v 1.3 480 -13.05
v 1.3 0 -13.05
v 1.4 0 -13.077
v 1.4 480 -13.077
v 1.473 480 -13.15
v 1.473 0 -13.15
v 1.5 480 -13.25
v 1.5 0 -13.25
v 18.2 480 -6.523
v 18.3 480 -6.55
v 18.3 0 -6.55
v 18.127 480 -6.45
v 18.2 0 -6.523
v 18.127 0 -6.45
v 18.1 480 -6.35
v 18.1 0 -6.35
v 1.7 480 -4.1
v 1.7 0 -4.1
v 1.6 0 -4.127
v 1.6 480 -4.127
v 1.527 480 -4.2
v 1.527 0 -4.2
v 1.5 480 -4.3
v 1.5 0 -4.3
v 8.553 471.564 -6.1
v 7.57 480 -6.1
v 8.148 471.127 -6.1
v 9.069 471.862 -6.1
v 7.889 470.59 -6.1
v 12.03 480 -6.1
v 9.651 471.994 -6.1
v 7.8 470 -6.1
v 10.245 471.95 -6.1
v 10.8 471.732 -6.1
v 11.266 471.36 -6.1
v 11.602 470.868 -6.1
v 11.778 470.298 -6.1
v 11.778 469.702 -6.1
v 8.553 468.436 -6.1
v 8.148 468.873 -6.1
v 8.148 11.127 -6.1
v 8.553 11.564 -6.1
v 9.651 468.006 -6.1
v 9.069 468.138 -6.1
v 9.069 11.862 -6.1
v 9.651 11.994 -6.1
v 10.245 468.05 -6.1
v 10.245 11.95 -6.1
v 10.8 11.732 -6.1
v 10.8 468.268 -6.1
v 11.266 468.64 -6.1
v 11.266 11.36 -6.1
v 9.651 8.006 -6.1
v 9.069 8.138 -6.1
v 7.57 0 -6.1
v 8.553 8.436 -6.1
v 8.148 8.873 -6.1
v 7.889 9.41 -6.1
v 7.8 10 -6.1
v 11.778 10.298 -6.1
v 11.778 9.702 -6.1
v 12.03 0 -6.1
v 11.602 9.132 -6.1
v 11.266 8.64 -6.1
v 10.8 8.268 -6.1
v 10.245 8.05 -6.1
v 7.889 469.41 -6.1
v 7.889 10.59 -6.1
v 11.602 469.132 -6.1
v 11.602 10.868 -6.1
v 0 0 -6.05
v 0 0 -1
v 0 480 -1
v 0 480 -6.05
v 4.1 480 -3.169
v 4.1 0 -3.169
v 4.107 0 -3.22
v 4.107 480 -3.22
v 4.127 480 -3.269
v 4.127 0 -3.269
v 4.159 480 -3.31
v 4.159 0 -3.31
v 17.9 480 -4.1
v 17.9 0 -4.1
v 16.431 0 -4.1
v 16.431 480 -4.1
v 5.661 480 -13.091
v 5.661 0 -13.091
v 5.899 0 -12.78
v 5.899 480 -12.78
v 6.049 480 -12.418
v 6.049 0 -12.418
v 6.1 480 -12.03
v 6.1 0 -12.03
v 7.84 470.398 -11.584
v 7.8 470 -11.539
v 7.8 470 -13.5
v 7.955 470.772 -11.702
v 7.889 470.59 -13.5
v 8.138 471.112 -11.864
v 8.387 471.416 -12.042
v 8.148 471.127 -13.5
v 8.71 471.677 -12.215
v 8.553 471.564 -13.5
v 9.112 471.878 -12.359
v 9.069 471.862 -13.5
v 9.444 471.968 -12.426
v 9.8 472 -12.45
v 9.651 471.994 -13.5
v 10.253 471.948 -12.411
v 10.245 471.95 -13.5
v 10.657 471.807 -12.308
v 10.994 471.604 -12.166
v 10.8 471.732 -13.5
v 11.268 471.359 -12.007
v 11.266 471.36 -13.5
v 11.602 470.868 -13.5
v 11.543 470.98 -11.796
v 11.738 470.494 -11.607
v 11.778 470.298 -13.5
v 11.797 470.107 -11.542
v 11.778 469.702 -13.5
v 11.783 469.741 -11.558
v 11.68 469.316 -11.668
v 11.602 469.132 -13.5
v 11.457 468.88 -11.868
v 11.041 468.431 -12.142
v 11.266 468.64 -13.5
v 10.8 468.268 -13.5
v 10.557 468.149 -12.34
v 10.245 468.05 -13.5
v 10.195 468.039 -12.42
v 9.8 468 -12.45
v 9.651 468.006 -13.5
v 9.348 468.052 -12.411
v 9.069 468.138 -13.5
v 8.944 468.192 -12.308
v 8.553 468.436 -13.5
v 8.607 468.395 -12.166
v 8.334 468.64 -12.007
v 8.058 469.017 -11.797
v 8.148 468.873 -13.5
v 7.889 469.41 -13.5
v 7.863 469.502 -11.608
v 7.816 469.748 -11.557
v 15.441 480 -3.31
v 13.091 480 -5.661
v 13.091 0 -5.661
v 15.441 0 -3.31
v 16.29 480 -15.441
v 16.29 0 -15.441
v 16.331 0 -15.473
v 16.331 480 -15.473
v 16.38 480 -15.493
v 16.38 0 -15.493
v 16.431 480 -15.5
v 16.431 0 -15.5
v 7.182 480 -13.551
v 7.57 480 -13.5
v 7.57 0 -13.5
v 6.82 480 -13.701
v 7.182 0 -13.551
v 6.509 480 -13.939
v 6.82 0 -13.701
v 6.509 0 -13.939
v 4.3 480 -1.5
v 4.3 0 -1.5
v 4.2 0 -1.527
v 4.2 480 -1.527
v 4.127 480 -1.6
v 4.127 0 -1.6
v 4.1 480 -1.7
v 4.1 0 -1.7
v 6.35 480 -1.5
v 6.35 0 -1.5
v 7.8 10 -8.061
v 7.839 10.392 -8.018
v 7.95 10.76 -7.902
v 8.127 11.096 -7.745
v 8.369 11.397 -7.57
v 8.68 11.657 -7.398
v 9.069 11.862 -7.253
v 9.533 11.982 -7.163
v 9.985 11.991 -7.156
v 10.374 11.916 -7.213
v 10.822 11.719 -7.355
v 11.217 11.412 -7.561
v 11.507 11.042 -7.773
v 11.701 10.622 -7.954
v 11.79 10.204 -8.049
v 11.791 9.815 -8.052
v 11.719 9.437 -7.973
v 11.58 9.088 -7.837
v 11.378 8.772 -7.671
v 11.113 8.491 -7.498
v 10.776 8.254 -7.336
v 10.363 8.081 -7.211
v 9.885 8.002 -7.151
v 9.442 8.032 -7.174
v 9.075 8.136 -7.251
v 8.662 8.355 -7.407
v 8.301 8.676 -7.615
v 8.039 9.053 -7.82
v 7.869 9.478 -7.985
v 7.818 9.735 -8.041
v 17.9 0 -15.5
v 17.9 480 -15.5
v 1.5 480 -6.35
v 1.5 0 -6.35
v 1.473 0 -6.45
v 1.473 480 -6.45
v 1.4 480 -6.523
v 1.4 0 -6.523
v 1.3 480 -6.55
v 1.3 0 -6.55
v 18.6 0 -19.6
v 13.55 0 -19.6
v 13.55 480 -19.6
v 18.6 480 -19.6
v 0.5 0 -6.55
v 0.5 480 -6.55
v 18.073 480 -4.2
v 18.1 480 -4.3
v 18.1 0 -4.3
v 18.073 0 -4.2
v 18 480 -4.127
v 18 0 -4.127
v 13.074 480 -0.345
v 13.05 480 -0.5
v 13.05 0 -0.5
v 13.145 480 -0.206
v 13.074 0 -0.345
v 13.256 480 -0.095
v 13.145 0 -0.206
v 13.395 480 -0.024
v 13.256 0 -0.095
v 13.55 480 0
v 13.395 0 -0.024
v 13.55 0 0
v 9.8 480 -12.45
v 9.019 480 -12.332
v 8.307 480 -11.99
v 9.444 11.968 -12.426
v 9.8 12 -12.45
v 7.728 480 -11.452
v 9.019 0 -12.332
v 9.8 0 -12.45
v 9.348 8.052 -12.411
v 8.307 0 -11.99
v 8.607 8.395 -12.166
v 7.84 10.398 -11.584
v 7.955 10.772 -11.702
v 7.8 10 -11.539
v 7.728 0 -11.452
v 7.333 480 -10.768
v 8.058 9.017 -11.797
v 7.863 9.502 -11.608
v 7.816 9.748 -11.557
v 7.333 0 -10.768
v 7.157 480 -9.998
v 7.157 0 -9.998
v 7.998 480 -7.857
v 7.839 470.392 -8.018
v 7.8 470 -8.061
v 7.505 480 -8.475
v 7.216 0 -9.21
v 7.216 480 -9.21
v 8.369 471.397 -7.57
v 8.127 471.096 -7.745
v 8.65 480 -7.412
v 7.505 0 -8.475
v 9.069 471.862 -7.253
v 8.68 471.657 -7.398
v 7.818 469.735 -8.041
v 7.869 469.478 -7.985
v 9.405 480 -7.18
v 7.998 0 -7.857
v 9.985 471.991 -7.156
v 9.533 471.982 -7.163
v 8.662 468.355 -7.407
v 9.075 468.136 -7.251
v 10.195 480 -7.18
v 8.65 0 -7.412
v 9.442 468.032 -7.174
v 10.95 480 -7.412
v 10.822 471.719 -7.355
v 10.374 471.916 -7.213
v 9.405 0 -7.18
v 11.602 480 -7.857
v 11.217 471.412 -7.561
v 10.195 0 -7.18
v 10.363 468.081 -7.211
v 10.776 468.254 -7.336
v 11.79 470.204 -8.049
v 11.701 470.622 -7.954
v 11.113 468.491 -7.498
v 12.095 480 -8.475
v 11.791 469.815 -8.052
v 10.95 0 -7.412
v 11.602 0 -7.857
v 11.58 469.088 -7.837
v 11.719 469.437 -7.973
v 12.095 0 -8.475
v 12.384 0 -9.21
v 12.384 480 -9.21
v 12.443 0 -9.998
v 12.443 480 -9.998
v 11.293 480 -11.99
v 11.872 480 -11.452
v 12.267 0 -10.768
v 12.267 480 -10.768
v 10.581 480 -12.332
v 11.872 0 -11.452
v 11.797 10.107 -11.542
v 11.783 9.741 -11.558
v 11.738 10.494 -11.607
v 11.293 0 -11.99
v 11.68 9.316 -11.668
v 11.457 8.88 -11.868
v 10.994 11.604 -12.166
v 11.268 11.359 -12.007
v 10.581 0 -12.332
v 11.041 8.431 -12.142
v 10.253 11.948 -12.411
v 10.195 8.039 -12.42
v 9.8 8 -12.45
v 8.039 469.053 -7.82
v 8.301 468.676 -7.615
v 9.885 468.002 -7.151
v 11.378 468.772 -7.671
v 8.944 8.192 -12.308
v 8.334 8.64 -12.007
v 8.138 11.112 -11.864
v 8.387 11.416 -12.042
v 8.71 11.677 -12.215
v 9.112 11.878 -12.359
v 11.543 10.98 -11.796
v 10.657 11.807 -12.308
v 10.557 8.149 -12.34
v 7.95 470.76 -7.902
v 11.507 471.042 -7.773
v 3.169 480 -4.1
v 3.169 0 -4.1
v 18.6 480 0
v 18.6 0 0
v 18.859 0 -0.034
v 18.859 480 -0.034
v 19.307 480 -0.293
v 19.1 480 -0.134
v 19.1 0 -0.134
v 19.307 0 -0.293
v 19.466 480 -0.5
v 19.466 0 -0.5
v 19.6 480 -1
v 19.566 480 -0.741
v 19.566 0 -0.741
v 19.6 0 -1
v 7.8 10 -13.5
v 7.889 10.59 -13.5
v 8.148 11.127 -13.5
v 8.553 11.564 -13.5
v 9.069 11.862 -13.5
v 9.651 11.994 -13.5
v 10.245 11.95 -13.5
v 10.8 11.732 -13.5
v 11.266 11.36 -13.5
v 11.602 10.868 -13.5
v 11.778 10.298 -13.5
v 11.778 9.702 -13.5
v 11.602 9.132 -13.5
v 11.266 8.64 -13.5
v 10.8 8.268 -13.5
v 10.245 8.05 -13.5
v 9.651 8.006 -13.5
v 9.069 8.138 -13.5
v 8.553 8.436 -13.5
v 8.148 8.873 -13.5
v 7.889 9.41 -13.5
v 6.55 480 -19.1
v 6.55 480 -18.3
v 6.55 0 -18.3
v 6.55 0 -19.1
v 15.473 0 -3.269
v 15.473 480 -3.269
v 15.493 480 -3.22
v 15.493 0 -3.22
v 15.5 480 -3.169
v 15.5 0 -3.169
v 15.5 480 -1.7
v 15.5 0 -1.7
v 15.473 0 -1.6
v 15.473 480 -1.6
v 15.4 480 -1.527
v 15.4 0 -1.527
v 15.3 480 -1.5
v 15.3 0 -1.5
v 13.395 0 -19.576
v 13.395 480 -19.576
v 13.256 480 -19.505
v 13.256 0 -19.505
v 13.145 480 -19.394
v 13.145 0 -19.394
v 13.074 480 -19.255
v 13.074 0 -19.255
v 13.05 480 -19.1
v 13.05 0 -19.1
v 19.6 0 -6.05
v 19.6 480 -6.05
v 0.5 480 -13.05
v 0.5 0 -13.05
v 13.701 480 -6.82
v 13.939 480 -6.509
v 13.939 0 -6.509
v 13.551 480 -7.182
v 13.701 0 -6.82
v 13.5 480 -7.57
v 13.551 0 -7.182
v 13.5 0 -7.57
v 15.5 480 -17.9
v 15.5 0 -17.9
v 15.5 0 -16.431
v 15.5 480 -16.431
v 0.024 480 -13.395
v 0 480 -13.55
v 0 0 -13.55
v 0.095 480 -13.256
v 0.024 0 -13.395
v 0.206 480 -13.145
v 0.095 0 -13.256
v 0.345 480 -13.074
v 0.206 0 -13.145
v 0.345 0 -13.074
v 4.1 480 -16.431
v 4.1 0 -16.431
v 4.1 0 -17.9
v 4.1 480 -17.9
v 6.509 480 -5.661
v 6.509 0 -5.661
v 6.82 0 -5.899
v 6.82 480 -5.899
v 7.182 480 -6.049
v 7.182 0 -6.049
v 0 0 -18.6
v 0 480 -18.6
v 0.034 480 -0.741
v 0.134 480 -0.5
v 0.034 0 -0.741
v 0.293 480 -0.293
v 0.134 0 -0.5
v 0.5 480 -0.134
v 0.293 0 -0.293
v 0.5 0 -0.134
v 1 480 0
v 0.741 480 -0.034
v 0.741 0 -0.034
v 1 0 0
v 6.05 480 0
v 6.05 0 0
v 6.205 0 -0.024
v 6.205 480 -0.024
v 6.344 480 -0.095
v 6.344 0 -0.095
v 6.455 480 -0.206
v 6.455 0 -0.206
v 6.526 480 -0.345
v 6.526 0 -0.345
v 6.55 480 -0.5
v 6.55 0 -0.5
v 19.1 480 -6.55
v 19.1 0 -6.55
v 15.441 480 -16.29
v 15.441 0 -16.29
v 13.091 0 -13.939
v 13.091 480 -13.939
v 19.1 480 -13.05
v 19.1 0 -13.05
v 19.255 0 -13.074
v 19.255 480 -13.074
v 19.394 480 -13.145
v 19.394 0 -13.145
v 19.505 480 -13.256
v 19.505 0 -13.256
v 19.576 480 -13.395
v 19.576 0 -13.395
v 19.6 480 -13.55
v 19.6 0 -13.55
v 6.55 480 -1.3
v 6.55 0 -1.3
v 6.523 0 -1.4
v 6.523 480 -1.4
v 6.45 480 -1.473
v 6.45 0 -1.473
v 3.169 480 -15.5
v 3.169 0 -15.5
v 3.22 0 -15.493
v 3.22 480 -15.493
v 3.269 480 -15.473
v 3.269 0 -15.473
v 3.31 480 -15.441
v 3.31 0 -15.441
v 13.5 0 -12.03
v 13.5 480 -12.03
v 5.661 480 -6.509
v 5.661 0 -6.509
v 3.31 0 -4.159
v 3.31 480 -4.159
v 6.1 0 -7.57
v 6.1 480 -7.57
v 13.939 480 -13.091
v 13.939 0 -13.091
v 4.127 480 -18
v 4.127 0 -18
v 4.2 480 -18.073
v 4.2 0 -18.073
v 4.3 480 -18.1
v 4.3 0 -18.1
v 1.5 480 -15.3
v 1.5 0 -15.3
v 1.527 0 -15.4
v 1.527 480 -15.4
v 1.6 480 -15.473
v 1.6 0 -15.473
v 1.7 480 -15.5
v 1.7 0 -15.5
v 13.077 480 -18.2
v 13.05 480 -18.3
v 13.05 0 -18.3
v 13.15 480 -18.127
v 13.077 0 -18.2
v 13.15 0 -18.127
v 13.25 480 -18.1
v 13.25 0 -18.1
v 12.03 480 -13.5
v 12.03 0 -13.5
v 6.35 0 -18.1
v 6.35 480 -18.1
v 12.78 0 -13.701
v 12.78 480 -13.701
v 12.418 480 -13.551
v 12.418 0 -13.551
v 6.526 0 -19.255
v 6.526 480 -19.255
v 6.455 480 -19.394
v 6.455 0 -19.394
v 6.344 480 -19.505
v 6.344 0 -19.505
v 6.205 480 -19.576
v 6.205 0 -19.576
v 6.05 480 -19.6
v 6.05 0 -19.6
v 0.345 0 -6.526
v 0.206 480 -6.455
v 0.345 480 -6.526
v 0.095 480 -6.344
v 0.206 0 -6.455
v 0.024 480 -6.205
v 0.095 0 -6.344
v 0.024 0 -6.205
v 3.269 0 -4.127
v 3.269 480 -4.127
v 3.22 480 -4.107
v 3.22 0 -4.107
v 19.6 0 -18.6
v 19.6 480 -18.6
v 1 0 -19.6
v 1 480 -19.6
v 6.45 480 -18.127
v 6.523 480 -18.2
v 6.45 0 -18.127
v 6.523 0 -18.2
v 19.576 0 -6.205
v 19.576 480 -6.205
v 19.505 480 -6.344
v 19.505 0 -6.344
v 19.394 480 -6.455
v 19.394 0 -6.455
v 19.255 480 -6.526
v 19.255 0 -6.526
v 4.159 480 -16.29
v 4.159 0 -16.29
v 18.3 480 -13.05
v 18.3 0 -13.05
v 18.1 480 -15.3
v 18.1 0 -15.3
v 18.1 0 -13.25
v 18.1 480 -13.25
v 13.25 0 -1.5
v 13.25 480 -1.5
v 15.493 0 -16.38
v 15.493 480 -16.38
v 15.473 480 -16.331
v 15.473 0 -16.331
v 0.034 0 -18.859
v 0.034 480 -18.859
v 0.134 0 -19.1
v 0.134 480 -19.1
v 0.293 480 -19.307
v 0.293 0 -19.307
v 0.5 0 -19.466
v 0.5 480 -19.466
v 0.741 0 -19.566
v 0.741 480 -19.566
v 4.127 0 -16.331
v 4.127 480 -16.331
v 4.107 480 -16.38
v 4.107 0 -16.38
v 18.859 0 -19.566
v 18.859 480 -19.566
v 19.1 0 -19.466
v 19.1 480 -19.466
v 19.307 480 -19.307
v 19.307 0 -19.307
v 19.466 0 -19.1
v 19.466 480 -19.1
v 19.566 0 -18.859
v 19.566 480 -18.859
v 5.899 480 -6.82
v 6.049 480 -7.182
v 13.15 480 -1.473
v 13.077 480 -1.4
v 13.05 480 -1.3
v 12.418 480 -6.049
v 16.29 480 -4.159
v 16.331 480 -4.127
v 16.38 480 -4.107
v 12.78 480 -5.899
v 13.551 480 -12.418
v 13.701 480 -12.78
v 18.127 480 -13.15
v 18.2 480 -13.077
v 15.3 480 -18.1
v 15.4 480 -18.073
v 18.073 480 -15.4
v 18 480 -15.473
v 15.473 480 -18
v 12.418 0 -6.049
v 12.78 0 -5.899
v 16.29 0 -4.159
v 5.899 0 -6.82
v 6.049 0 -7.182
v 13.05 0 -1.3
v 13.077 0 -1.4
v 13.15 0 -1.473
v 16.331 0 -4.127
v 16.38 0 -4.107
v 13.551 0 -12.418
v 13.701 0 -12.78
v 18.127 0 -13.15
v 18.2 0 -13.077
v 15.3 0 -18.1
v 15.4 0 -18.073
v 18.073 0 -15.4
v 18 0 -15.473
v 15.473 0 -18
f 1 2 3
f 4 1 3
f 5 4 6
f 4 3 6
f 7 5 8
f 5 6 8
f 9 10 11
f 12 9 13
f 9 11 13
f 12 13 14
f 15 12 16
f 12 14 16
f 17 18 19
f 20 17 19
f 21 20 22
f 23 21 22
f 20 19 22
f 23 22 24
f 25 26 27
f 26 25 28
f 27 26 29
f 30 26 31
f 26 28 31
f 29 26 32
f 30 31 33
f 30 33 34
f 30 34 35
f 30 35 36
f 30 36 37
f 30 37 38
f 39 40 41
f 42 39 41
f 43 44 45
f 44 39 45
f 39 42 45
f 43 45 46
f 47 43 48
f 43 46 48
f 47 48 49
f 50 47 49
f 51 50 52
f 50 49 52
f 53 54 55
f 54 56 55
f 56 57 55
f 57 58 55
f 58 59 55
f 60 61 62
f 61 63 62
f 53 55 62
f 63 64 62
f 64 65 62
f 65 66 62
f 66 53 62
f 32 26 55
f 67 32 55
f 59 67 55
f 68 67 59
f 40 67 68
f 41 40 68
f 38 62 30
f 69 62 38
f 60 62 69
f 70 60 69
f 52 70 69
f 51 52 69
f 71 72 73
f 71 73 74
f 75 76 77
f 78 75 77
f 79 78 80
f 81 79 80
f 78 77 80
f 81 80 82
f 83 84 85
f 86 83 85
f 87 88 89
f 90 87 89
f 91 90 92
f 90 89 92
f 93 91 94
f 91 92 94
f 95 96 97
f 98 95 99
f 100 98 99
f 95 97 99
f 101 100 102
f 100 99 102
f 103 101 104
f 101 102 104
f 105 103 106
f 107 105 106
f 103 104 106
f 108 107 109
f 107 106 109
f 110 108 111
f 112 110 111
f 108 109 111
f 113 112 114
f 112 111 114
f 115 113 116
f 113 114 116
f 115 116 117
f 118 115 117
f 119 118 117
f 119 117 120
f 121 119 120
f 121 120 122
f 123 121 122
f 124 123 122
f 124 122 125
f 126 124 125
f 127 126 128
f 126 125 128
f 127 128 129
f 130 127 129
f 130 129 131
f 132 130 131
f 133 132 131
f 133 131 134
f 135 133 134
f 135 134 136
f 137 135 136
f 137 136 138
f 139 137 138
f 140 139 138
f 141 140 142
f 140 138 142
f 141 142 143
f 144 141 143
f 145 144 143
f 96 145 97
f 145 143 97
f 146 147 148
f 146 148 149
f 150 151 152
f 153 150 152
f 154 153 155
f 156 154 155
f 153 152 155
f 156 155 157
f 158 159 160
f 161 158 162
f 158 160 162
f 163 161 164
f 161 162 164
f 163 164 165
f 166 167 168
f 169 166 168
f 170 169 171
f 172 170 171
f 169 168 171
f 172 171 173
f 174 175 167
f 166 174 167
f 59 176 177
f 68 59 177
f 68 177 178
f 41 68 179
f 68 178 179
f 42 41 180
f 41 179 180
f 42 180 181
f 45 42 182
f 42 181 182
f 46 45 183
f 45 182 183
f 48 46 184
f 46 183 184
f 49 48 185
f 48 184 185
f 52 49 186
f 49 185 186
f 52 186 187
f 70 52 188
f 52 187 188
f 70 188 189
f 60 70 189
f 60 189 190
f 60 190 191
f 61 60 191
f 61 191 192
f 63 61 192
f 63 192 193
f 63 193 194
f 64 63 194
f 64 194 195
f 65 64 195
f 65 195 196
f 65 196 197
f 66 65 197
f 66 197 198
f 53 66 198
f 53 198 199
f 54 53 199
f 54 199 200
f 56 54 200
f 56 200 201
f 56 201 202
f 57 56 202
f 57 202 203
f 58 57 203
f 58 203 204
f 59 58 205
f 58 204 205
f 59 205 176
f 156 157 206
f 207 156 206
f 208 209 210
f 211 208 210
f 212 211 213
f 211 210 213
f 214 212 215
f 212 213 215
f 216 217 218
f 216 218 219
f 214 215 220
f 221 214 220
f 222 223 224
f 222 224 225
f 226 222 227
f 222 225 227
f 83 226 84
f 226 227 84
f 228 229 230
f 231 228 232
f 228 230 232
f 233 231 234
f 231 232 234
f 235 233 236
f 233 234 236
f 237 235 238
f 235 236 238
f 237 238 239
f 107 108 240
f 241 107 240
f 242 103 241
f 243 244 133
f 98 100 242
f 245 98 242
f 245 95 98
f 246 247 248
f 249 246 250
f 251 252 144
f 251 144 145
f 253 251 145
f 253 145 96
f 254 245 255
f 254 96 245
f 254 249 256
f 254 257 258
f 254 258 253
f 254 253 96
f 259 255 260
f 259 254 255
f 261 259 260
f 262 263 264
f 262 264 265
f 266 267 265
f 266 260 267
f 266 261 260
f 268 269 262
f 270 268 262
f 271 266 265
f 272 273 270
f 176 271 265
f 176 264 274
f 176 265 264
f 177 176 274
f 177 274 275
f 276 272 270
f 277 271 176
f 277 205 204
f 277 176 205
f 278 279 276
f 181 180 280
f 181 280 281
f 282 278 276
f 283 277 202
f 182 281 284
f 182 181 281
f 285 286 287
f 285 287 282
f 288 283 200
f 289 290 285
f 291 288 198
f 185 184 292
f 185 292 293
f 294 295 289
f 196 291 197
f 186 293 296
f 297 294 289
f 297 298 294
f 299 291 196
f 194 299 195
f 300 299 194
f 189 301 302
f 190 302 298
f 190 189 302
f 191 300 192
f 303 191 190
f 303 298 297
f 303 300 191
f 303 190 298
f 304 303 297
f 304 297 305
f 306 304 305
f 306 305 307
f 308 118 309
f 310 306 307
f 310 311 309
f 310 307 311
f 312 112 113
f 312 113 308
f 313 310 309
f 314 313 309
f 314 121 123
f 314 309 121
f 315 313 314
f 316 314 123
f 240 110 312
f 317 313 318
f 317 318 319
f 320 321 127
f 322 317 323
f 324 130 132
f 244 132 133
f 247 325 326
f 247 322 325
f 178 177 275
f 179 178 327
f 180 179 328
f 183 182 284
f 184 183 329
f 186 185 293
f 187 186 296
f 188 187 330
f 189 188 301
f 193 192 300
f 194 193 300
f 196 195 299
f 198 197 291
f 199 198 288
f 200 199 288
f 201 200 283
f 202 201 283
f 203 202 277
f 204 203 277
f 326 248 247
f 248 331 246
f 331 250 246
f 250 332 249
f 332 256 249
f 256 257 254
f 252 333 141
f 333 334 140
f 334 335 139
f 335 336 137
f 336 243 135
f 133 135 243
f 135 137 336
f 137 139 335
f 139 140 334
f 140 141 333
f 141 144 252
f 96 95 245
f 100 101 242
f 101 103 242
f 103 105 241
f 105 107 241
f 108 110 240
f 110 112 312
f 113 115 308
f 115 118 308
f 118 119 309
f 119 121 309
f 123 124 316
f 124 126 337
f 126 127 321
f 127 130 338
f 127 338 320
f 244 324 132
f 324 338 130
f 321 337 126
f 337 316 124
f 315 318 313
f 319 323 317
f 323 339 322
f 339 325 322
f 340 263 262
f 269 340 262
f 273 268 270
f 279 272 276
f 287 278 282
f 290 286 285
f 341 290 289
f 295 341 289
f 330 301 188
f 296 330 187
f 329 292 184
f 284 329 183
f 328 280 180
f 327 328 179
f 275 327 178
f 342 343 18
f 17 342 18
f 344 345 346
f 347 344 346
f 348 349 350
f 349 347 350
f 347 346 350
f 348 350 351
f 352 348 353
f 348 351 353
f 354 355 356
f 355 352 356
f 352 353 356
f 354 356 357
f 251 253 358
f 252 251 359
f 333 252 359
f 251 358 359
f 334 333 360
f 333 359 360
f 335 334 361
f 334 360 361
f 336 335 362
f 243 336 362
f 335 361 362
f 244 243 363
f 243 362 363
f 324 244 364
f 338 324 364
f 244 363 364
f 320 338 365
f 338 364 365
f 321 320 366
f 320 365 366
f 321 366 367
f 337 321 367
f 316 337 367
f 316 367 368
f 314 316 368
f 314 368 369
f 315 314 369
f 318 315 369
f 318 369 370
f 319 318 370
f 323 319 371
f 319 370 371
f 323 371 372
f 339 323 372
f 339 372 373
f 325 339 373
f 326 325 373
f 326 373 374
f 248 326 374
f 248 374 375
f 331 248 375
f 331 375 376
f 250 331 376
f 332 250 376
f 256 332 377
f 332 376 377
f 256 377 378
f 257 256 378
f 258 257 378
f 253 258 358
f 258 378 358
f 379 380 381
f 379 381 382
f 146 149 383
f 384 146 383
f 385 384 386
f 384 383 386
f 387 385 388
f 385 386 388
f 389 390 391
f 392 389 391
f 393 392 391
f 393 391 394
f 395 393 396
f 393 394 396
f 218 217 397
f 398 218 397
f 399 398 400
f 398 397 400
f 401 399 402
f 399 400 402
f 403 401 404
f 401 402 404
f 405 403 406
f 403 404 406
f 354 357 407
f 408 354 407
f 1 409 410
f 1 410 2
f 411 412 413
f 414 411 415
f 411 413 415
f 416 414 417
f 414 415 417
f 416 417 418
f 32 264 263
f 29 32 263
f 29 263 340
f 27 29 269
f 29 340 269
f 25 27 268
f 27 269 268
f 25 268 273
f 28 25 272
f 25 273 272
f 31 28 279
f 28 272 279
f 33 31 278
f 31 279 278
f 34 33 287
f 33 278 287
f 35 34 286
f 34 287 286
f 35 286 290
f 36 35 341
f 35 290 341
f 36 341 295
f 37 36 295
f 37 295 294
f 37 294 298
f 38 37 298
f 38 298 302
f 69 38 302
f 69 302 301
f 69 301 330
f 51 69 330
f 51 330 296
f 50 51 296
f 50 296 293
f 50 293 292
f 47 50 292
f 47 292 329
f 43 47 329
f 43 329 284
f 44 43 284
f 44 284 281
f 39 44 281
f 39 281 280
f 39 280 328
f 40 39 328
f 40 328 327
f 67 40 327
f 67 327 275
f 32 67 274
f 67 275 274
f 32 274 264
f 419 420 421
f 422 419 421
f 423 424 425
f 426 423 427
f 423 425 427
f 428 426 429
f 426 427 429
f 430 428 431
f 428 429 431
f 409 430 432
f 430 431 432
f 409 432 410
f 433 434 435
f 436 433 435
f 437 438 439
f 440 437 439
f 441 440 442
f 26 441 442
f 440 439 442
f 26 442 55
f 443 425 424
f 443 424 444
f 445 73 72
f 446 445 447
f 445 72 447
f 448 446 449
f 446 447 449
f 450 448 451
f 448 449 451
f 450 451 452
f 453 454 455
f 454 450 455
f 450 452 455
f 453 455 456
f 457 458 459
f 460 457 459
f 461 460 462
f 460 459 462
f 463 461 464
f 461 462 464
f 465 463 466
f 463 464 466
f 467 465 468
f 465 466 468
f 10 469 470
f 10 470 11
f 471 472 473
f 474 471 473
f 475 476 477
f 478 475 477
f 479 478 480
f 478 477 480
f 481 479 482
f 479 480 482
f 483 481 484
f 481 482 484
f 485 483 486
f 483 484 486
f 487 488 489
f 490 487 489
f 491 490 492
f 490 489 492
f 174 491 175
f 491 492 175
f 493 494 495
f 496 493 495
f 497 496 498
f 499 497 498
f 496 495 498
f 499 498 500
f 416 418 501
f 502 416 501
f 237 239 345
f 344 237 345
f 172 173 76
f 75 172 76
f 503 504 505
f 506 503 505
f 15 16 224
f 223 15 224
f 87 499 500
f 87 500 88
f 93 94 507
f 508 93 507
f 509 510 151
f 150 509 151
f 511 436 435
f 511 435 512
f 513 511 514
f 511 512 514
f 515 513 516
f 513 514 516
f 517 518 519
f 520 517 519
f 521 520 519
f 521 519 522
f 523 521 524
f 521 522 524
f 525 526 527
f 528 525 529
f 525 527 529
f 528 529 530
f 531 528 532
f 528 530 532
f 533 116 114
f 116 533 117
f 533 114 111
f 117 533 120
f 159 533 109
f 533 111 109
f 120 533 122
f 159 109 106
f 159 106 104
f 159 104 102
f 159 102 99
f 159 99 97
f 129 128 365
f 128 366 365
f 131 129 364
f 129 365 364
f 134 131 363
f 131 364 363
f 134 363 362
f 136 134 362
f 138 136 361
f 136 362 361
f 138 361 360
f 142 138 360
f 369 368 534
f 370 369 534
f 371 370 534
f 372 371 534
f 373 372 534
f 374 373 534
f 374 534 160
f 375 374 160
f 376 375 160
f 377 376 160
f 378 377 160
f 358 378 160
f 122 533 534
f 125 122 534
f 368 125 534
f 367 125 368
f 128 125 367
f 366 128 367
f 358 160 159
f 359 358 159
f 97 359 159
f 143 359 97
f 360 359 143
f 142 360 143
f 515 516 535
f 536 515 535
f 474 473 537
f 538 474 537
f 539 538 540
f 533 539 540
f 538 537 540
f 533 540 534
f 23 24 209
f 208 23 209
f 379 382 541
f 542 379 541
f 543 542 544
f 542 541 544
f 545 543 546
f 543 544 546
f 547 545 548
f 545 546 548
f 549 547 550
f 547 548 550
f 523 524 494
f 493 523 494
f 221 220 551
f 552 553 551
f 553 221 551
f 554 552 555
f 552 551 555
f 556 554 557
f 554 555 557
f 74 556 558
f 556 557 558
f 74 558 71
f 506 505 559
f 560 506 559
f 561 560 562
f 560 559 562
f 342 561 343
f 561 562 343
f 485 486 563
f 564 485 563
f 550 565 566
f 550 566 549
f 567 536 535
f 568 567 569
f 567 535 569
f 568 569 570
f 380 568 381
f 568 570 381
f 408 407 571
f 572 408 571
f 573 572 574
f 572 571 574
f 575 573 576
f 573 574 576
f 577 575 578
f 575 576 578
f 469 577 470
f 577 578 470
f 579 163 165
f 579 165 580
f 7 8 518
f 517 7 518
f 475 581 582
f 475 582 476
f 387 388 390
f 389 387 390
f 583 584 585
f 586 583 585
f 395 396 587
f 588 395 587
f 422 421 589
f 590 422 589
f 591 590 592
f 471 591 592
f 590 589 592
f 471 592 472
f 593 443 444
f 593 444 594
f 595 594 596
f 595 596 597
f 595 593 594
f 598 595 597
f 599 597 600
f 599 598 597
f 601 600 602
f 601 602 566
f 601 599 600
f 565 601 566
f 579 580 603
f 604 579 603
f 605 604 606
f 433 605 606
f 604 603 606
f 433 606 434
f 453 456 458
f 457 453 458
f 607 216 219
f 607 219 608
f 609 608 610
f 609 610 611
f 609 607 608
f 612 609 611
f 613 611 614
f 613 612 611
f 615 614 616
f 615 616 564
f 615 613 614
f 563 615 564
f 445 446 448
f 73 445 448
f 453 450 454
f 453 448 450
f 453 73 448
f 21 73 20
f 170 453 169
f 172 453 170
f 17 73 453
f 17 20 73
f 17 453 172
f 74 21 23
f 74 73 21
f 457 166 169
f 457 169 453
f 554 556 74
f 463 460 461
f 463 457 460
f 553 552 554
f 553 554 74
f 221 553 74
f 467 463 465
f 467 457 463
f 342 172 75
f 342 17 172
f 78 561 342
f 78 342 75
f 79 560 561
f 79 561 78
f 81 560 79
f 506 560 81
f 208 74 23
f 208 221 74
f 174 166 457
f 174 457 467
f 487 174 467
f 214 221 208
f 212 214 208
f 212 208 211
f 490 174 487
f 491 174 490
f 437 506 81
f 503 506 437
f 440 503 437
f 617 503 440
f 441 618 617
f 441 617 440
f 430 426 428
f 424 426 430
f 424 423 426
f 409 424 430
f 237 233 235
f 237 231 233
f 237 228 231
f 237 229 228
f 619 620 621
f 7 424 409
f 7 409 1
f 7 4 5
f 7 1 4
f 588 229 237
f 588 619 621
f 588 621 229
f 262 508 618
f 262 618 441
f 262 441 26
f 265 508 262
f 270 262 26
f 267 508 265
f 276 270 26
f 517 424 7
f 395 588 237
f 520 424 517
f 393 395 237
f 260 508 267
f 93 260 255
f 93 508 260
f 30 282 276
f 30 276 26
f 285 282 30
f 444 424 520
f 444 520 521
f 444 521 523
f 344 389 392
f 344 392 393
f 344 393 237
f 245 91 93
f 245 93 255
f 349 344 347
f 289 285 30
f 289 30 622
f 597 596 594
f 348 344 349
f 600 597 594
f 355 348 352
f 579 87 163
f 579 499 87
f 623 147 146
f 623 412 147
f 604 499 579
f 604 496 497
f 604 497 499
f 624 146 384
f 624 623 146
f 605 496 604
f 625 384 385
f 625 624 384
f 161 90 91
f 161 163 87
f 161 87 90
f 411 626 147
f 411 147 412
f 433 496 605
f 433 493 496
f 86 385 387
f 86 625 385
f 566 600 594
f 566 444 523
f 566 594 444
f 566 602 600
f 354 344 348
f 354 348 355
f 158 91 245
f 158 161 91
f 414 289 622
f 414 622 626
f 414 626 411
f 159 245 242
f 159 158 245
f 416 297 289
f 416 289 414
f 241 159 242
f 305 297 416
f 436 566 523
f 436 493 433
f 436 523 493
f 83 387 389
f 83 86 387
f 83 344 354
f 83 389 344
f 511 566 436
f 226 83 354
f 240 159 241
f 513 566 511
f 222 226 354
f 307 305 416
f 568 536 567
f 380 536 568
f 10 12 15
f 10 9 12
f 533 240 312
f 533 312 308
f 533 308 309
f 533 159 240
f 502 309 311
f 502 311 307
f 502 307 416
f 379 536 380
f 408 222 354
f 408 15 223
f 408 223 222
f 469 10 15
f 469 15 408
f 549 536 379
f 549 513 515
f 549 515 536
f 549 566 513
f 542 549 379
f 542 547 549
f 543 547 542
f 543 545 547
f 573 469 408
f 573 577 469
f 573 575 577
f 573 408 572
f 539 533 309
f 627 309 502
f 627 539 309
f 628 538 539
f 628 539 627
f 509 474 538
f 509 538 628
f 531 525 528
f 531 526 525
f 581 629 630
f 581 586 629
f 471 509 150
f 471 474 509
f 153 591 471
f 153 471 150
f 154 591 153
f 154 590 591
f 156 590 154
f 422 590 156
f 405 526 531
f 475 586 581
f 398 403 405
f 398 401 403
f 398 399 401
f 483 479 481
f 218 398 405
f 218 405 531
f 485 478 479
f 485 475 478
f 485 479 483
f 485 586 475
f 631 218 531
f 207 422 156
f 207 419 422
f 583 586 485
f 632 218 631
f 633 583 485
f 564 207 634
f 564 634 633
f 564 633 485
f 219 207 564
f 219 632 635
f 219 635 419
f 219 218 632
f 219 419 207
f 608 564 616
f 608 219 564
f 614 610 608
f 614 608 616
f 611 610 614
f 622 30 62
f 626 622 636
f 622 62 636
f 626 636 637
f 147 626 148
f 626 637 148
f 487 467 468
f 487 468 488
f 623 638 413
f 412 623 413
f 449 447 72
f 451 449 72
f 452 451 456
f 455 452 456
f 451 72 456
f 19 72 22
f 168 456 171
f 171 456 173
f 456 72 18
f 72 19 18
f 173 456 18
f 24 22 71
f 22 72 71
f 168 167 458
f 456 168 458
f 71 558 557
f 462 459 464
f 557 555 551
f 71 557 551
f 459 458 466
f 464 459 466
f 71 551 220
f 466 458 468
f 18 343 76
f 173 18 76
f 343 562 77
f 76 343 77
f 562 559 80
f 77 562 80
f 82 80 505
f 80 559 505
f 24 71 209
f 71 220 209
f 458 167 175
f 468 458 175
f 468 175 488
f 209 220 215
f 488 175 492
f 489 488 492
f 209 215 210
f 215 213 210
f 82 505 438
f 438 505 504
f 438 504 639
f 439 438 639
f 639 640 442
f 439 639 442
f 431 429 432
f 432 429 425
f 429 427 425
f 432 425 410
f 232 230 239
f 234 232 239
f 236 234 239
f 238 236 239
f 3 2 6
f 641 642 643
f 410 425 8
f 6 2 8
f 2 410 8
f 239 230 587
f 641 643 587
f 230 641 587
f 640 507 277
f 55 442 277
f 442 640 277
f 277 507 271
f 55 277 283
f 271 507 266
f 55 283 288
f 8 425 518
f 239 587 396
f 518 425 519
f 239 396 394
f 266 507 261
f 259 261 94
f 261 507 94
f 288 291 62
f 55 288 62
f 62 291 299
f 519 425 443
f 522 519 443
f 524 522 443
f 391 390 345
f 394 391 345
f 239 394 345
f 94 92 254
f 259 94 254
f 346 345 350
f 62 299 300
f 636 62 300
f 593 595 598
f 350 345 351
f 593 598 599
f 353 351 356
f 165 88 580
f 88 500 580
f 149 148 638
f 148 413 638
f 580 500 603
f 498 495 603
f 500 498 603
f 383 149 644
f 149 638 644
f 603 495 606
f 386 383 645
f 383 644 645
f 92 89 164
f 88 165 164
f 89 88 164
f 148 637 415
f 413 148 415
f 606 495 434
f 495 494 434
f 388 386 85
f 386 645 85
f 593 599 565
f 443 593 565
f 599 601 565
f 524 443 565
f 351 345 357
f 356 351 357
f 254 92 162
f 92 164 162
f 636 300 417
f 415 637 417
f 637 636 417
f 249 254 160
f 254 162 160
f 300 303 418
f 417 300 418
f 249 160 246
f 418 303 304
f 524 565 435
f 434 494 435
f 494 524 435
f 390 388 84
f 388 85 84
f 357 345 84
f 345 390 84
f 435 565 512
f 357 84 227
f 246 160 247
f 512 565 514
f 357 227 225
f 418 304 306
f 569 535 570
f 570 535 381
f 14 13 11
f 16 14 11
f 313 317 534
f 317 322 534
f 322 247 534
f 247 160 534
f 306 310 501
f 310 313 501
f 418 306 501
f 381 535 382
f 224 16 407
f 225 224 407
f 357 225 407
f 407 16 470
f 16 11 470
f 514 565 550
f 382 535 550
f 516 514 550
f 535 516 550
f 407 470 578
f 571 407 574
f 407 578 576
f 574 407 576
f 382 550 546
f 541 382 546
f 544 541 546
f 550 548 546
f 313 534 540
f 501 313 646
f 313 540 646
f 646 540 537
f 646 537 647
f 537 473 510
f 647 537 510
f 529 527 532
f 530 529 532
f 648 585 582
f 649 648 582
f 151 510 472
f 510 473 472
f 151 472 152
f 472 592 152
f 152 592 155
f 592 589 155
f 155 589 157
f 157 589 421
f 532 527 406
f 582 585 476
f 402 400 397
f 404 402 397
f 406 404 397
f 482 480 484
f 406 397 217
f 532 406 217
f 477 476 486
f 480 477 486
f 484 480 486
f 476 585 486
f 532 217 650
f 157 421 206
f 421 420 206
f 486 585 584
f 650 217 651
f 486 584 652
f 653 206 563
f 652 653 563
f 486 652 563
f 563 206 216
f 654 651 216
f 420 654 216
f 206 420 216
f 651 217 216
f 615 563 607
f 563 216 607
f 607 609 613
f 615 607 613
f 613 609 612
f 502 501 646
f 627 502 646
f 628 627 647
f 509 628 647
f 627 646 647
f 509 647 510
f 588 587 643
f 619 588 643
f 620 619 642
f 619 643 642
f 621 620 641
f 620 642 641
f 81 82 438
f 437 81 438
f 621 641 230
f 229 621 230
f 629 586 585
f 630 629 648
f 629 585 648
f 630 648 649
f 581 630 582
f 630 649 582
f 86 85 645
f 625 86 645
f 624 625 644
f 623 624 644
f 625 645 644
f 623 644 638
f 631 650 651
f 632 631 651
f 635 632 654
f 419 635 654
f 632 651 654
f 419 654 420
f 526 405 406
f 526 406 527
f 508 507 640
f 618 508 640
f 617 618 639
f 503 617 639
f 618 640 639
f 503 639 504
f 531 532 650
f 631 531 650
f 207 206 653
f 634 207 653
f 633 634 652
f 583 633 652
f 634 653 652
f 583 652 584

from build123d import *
from build123d.topology import SkipClean

# Parameters (mm, degrees)
SKETCH1_W           = 19.6
SKETCH1_H           = 19.6
BOSS_EXTRUDE1_DEPTH = 480
CUT_EXTRUDE3_DEPTH  = 481.799667221
SKETCH6_R           = 2
CUT_EXTRUDE5_DEPTH  = 10


with BuildPart() as part:
    # Sketch1 → Boss-Extrude1 (new body)
    with BuildSketch(Plane(origin=(0, 0, 0), x_dir=(1, 0, 0), z_dir=(0, 1, 0))):
        with Locations((9.8, 9.8)):
            Rectangle(SKETCH1_W, SKETCH1_H)
    extrude(amount=BOSS_EXTRUDE1_DEPTH)

    # Sketch4 → Cut-Extrude3 (cut, through all)
    with BuildSketch(Plane.XZ):
        with BuildLine():
            Line((6.05, -19.6), (13.55, -19.6))
            ThreePointArc((13.55, -19.6), (13.196446609, -19.453553391), (13.05, -19.1))
            Line((13.05, -19.1), (13.05, -18.3))
            ThreePointArc((13.05, -18.3), (13.108578644, -18.158578644), (13.25, -18.1))
            Line((13.25, -18.1), (15.3, -18.1))
            ThreePointArc((15.3, -18.1), (15.441421356, -18.041421356), (15.5, -17.9))
            Line((15.5, -17.9), (15.5, -16.43137085))
            ThreePointArc((15.5, -16.43137085), (15.484775907, -16.354834163), (15.441421356, -16.289949494))
            Line((15.441421356, -16.289949494), (13.090811691, -13.939339828))
            ThreePointArc((13.090811691, -13.939339828), (12.604176668, -13.614180701), (12.030151519, -13.5))
            Line((12.030151519, -13.5), (9.8, -13.5))
            Line((9.8, -13.5), (7.569848481, -13.5))
            ThreePointArc((7.569848481, -13.5), (6.995823332, -13.614180701), (6.509188309, -13.939339828))
            Line((6.509188309, -13.939339828), (4.158578644, -16.289949494))
            ThreePointArc((4.158578644, -16.289949494), (4.115224093, -16.354834163), (4.1, -16.43137085))
            Line((4.1, -16.43137085), (4.1, -17.9))
            ThreePointArc((4.1, -17.9), (4.158578644, -18.041421356), (4.3, -18.1))
            Line((4.3, -18.1), (6.35, -18.1))
            ThreePointArc((6.35, -18.1), (6.491421356, -18.158578644), (6.55, -18.3))
            Line((6.55, -18.3), (6.55, -19.1))
            ThreePointArc((6.55, -19.1), (6.403553391, -19.453553391), (6.05, -19.6))
        make_face()
        with BuildLine():
            Line((0, -6.05), (0, -13.55))
            ThreePointArc((0, -13.55), (0.146446609, -13.196446609), (0.5, -13.05))
            Line((0.5, -13.05), (1.3, -13.05))
            ThreePointArc((1.3, -13.05), (1.441421356, -13.108578644), (1.5, -13.25))
            Line((1.5, -13.25), (1.5, -15.3))
            ThreePointArc((1.5, -15.3), (1.558578644, -15.441421356), (1.7, -15.5))
            Line((1.7, -15.5), (3.16862915, -15.5))
            ThreePointArc((3.16862915, -15.5), (3.245165837, -15.484775907), (3.310050506, -15.441421356))
            Line((3.310050506, -15.441421356), (5.660660172, -13.090811691))
            ThreePointArc((5.660660172, -13.090811691), (5.985819299, -12.604176668), (6.1, -12.030151519))
            Line((6.1, -12.030151519), (6.1, -7.569848481))
            ThreePointArc((6.1, -7.569848481), (5.985819299, -6.995823332), (5.660660172, -6.509188309))
            Line((5.660660172, -6.509188309), (3.310050506, -4.158578644))
            ThreePointArc((3.310050506, -4.158578644), (3.245165837, -4.115224093), (3.16862915, -4.1))
            Line((3.16862915, -4.1), (1.7, -4.1))
            ThreePointArc((1.7, -4.1), (1.558578644, -4.158578644), (1.5, -4.3))
            Line((1.5, -4.3), (1.5, -6.35))
            ThreePointArc((1.5, -6.35), (1.441421356, -6.491421356), (1.3, -6.55))
            Line((1.3, -6.55), (0.5, -6.55))
            ThreePointArc((0.5, -6.55), (0.146446609, -6.403553391), (0, -6.05))
        make_face()
        with BuildLine():
            ThreePointArc((19.1, -13.05), (19.453553391, -13.196446609), (19.6, -13.55))
            Line((19.6, -13.55), (19.6, -6.05))
            ThreePointArc((19.6, -6.05), (19.453553391, -6.403553391), (19.1, -6.55))
            Line((19.1, -6.55), (18.3, -6.55))
            ThreePointArc((18.3, -6.55), (18.158578644, -6.491421356), (18.1, -6.35))
            Line((18.1, -6.35), (18.1, -4.3))
            ThreePointArc((18.1, -4.3), (18.041421356, -4.158578644), (17.9, -4.1))
            Line((17.9, -4.1), (16.43137085, -4.1))
            ThreePointArc((16.43137085, -4.1), (16.354834163, -4.115224093), (16.289949494, -4.158578644))
            Line((16.289949494, -4.158578644), (13.939339828, -6.509188309))
            ThreePointArc((13.939339828, -6.509188309), (13.614180701, -6.995823332), (13.5, -7.569848481))
            Line((13.5, -7.569848481), (13.5, -12.030151519))
            ThreePointArc((13.5, -12.030151519), (13.614180701, -12.604176668), (13.939339828, -13.090811691))
            Line((13.939339828, -13.090811691), (16.289949494, -15.441421356))
            ThreePointArc((16.289949494, -15.441421356), (16.354834163, -15.484775907), (16.43137085, -15.5))
            Line((16.43137085, -15.5), (17.9, -15.5))
            ThreePointArc((17.9, -15.5), (18.041421356, -15.441421356), (18.1, -15.3))
            Line((18.1, -15.3), (18.1, -13.25))
            ThreePointArc((18.1, -13.25), (18.158578644, -13.108578644), (18.3, -13.05))
            Line((18.3, -13.05), (19.1, -13.05))
        make_face()
        with BuildLine():
            ThreePointArc((13.05, -0.5), (13.196446609, -0.146446609), (13.55, 0))
            Line((13.55, 0), (6.05, 0))
            ThreePointArc((6.05, 0), (6.403553391, -0.146446609), (6.55, -0.5))
            Line((6.55, -0.5), (6.55, -1.3))
            ThreePointArc((6.55, -1.3), (6.491421356, -1.441421356), (6.35, -1.5))
            Line((6.35, -1.5), (4.3, -1.5))
            ThreePointArc((4.3, -1.5), (4.158578644, -1.558578644), (4.1, -1.7))
            Line((4.1, -1.7), (4.1, -3.16862915))
            ThreePointArc((4.1, -3.16862915), (4.115224093, -3.245165837), (4.158578644, -3.310050506))
            Line((4.158578644, -3.310050506), (6.509188309, -5.660660172))
            ThreePointArc((6.509188309, -5.660660172), (6.995823332, -5.985819299), (7.569848481, -6.1))
            Line((7.569848481, -6.1), (9.8, -6.1))
            Line((9.8, -6.1), (12.030151519, -6.1))
            ThreePointArc((12.030151519, -6.1), (12.604176668, -5.985819299), (13.090811691, -5.660660172))
            Line((13.090811691, -5.660660172), (15.441421356, -3.310050506))
            ThreePointArc((15.441421356, -3.310050506), (15.484775907, -3.245165837), (15.5, -3.16862915))
            Line((15.5, -3.16862915), (15.5, -1.7))
            ThreePointArc((15.5, -1.7), (15.441421356, -1.558578644), (15.3, -1.5))
            Line((15.3, -1.5), (13.25, -1.5))
            ThreePointArc((13.25, -1.5), (13.108578644, -1.441421356), (13.05, -1.3))
            Line((13.05, -1.3), (13.05, -0.5))
        make_face()
        with BuildLine():
            ThreePointArc((18.6, 0), (19.307106781, -0.292893219), (19.6, -1))
            Line((19.6, -1), (19.6, 0))
            Line((19.6, 0), (18.6, 0))
        make_face()
        with BuildLine():
            ThreePointArc((0, -1), (0.292893219, -0.292893219), (1, 0))
            Line((1, 0), (0, 0))
            Line((0, 0), (0, -1))
        make_face()
        with BuildLine():
            ThreePointArc((9.8, -7.15), (12.45, -9.8), (9.8, -12.45))
            ThreePointArc((9.8, -12.45), (7.15, -9.8), (9.8, -7.15))
        make_face()
        with BuildLine():
            Line((19.6, -19.6), (18.6, -19.6))
            ThreePointArc((18.6, -19.6), (19.307106781, -19.307106781), (19.6, -18.6))
            Line((19.6, -18.6), (19.6, -19.6))
        make_face()
        with BuildLine():
            Line((0, -19.6), (0, -18.6))
            ThreePointArc((0, -18.6), (0.292893219, -19.307106781), (1, -19.6))
            Line((1, -19.6), (0, -19.6))
        make_face()
    extrude(amount=-CUT_EXTRUDE3_DEPTH, mode=Mode.SUBTRACT)

    # Sketch6 → Cut-Extrude5 (cut)
    with SkipClean():  # the faces are left unmerged after this step: merging them gives an invalid solid
        with BuildSketch(Plane(origin=(0, 0, -13.5), x_dir=(-1, 0, 0), z_dir=(0, 0, -1))):
            with Locations((-9.8, 10)):
                Circle(SKETCH6_R)
            with Locations((-9.8, 470)):
                Circle(SKETCH6_R)
        extrude(amount=-CUT_EXTRUDE5_DEPTH, mode=Mode.SUBTRACT)


solid = part.part
